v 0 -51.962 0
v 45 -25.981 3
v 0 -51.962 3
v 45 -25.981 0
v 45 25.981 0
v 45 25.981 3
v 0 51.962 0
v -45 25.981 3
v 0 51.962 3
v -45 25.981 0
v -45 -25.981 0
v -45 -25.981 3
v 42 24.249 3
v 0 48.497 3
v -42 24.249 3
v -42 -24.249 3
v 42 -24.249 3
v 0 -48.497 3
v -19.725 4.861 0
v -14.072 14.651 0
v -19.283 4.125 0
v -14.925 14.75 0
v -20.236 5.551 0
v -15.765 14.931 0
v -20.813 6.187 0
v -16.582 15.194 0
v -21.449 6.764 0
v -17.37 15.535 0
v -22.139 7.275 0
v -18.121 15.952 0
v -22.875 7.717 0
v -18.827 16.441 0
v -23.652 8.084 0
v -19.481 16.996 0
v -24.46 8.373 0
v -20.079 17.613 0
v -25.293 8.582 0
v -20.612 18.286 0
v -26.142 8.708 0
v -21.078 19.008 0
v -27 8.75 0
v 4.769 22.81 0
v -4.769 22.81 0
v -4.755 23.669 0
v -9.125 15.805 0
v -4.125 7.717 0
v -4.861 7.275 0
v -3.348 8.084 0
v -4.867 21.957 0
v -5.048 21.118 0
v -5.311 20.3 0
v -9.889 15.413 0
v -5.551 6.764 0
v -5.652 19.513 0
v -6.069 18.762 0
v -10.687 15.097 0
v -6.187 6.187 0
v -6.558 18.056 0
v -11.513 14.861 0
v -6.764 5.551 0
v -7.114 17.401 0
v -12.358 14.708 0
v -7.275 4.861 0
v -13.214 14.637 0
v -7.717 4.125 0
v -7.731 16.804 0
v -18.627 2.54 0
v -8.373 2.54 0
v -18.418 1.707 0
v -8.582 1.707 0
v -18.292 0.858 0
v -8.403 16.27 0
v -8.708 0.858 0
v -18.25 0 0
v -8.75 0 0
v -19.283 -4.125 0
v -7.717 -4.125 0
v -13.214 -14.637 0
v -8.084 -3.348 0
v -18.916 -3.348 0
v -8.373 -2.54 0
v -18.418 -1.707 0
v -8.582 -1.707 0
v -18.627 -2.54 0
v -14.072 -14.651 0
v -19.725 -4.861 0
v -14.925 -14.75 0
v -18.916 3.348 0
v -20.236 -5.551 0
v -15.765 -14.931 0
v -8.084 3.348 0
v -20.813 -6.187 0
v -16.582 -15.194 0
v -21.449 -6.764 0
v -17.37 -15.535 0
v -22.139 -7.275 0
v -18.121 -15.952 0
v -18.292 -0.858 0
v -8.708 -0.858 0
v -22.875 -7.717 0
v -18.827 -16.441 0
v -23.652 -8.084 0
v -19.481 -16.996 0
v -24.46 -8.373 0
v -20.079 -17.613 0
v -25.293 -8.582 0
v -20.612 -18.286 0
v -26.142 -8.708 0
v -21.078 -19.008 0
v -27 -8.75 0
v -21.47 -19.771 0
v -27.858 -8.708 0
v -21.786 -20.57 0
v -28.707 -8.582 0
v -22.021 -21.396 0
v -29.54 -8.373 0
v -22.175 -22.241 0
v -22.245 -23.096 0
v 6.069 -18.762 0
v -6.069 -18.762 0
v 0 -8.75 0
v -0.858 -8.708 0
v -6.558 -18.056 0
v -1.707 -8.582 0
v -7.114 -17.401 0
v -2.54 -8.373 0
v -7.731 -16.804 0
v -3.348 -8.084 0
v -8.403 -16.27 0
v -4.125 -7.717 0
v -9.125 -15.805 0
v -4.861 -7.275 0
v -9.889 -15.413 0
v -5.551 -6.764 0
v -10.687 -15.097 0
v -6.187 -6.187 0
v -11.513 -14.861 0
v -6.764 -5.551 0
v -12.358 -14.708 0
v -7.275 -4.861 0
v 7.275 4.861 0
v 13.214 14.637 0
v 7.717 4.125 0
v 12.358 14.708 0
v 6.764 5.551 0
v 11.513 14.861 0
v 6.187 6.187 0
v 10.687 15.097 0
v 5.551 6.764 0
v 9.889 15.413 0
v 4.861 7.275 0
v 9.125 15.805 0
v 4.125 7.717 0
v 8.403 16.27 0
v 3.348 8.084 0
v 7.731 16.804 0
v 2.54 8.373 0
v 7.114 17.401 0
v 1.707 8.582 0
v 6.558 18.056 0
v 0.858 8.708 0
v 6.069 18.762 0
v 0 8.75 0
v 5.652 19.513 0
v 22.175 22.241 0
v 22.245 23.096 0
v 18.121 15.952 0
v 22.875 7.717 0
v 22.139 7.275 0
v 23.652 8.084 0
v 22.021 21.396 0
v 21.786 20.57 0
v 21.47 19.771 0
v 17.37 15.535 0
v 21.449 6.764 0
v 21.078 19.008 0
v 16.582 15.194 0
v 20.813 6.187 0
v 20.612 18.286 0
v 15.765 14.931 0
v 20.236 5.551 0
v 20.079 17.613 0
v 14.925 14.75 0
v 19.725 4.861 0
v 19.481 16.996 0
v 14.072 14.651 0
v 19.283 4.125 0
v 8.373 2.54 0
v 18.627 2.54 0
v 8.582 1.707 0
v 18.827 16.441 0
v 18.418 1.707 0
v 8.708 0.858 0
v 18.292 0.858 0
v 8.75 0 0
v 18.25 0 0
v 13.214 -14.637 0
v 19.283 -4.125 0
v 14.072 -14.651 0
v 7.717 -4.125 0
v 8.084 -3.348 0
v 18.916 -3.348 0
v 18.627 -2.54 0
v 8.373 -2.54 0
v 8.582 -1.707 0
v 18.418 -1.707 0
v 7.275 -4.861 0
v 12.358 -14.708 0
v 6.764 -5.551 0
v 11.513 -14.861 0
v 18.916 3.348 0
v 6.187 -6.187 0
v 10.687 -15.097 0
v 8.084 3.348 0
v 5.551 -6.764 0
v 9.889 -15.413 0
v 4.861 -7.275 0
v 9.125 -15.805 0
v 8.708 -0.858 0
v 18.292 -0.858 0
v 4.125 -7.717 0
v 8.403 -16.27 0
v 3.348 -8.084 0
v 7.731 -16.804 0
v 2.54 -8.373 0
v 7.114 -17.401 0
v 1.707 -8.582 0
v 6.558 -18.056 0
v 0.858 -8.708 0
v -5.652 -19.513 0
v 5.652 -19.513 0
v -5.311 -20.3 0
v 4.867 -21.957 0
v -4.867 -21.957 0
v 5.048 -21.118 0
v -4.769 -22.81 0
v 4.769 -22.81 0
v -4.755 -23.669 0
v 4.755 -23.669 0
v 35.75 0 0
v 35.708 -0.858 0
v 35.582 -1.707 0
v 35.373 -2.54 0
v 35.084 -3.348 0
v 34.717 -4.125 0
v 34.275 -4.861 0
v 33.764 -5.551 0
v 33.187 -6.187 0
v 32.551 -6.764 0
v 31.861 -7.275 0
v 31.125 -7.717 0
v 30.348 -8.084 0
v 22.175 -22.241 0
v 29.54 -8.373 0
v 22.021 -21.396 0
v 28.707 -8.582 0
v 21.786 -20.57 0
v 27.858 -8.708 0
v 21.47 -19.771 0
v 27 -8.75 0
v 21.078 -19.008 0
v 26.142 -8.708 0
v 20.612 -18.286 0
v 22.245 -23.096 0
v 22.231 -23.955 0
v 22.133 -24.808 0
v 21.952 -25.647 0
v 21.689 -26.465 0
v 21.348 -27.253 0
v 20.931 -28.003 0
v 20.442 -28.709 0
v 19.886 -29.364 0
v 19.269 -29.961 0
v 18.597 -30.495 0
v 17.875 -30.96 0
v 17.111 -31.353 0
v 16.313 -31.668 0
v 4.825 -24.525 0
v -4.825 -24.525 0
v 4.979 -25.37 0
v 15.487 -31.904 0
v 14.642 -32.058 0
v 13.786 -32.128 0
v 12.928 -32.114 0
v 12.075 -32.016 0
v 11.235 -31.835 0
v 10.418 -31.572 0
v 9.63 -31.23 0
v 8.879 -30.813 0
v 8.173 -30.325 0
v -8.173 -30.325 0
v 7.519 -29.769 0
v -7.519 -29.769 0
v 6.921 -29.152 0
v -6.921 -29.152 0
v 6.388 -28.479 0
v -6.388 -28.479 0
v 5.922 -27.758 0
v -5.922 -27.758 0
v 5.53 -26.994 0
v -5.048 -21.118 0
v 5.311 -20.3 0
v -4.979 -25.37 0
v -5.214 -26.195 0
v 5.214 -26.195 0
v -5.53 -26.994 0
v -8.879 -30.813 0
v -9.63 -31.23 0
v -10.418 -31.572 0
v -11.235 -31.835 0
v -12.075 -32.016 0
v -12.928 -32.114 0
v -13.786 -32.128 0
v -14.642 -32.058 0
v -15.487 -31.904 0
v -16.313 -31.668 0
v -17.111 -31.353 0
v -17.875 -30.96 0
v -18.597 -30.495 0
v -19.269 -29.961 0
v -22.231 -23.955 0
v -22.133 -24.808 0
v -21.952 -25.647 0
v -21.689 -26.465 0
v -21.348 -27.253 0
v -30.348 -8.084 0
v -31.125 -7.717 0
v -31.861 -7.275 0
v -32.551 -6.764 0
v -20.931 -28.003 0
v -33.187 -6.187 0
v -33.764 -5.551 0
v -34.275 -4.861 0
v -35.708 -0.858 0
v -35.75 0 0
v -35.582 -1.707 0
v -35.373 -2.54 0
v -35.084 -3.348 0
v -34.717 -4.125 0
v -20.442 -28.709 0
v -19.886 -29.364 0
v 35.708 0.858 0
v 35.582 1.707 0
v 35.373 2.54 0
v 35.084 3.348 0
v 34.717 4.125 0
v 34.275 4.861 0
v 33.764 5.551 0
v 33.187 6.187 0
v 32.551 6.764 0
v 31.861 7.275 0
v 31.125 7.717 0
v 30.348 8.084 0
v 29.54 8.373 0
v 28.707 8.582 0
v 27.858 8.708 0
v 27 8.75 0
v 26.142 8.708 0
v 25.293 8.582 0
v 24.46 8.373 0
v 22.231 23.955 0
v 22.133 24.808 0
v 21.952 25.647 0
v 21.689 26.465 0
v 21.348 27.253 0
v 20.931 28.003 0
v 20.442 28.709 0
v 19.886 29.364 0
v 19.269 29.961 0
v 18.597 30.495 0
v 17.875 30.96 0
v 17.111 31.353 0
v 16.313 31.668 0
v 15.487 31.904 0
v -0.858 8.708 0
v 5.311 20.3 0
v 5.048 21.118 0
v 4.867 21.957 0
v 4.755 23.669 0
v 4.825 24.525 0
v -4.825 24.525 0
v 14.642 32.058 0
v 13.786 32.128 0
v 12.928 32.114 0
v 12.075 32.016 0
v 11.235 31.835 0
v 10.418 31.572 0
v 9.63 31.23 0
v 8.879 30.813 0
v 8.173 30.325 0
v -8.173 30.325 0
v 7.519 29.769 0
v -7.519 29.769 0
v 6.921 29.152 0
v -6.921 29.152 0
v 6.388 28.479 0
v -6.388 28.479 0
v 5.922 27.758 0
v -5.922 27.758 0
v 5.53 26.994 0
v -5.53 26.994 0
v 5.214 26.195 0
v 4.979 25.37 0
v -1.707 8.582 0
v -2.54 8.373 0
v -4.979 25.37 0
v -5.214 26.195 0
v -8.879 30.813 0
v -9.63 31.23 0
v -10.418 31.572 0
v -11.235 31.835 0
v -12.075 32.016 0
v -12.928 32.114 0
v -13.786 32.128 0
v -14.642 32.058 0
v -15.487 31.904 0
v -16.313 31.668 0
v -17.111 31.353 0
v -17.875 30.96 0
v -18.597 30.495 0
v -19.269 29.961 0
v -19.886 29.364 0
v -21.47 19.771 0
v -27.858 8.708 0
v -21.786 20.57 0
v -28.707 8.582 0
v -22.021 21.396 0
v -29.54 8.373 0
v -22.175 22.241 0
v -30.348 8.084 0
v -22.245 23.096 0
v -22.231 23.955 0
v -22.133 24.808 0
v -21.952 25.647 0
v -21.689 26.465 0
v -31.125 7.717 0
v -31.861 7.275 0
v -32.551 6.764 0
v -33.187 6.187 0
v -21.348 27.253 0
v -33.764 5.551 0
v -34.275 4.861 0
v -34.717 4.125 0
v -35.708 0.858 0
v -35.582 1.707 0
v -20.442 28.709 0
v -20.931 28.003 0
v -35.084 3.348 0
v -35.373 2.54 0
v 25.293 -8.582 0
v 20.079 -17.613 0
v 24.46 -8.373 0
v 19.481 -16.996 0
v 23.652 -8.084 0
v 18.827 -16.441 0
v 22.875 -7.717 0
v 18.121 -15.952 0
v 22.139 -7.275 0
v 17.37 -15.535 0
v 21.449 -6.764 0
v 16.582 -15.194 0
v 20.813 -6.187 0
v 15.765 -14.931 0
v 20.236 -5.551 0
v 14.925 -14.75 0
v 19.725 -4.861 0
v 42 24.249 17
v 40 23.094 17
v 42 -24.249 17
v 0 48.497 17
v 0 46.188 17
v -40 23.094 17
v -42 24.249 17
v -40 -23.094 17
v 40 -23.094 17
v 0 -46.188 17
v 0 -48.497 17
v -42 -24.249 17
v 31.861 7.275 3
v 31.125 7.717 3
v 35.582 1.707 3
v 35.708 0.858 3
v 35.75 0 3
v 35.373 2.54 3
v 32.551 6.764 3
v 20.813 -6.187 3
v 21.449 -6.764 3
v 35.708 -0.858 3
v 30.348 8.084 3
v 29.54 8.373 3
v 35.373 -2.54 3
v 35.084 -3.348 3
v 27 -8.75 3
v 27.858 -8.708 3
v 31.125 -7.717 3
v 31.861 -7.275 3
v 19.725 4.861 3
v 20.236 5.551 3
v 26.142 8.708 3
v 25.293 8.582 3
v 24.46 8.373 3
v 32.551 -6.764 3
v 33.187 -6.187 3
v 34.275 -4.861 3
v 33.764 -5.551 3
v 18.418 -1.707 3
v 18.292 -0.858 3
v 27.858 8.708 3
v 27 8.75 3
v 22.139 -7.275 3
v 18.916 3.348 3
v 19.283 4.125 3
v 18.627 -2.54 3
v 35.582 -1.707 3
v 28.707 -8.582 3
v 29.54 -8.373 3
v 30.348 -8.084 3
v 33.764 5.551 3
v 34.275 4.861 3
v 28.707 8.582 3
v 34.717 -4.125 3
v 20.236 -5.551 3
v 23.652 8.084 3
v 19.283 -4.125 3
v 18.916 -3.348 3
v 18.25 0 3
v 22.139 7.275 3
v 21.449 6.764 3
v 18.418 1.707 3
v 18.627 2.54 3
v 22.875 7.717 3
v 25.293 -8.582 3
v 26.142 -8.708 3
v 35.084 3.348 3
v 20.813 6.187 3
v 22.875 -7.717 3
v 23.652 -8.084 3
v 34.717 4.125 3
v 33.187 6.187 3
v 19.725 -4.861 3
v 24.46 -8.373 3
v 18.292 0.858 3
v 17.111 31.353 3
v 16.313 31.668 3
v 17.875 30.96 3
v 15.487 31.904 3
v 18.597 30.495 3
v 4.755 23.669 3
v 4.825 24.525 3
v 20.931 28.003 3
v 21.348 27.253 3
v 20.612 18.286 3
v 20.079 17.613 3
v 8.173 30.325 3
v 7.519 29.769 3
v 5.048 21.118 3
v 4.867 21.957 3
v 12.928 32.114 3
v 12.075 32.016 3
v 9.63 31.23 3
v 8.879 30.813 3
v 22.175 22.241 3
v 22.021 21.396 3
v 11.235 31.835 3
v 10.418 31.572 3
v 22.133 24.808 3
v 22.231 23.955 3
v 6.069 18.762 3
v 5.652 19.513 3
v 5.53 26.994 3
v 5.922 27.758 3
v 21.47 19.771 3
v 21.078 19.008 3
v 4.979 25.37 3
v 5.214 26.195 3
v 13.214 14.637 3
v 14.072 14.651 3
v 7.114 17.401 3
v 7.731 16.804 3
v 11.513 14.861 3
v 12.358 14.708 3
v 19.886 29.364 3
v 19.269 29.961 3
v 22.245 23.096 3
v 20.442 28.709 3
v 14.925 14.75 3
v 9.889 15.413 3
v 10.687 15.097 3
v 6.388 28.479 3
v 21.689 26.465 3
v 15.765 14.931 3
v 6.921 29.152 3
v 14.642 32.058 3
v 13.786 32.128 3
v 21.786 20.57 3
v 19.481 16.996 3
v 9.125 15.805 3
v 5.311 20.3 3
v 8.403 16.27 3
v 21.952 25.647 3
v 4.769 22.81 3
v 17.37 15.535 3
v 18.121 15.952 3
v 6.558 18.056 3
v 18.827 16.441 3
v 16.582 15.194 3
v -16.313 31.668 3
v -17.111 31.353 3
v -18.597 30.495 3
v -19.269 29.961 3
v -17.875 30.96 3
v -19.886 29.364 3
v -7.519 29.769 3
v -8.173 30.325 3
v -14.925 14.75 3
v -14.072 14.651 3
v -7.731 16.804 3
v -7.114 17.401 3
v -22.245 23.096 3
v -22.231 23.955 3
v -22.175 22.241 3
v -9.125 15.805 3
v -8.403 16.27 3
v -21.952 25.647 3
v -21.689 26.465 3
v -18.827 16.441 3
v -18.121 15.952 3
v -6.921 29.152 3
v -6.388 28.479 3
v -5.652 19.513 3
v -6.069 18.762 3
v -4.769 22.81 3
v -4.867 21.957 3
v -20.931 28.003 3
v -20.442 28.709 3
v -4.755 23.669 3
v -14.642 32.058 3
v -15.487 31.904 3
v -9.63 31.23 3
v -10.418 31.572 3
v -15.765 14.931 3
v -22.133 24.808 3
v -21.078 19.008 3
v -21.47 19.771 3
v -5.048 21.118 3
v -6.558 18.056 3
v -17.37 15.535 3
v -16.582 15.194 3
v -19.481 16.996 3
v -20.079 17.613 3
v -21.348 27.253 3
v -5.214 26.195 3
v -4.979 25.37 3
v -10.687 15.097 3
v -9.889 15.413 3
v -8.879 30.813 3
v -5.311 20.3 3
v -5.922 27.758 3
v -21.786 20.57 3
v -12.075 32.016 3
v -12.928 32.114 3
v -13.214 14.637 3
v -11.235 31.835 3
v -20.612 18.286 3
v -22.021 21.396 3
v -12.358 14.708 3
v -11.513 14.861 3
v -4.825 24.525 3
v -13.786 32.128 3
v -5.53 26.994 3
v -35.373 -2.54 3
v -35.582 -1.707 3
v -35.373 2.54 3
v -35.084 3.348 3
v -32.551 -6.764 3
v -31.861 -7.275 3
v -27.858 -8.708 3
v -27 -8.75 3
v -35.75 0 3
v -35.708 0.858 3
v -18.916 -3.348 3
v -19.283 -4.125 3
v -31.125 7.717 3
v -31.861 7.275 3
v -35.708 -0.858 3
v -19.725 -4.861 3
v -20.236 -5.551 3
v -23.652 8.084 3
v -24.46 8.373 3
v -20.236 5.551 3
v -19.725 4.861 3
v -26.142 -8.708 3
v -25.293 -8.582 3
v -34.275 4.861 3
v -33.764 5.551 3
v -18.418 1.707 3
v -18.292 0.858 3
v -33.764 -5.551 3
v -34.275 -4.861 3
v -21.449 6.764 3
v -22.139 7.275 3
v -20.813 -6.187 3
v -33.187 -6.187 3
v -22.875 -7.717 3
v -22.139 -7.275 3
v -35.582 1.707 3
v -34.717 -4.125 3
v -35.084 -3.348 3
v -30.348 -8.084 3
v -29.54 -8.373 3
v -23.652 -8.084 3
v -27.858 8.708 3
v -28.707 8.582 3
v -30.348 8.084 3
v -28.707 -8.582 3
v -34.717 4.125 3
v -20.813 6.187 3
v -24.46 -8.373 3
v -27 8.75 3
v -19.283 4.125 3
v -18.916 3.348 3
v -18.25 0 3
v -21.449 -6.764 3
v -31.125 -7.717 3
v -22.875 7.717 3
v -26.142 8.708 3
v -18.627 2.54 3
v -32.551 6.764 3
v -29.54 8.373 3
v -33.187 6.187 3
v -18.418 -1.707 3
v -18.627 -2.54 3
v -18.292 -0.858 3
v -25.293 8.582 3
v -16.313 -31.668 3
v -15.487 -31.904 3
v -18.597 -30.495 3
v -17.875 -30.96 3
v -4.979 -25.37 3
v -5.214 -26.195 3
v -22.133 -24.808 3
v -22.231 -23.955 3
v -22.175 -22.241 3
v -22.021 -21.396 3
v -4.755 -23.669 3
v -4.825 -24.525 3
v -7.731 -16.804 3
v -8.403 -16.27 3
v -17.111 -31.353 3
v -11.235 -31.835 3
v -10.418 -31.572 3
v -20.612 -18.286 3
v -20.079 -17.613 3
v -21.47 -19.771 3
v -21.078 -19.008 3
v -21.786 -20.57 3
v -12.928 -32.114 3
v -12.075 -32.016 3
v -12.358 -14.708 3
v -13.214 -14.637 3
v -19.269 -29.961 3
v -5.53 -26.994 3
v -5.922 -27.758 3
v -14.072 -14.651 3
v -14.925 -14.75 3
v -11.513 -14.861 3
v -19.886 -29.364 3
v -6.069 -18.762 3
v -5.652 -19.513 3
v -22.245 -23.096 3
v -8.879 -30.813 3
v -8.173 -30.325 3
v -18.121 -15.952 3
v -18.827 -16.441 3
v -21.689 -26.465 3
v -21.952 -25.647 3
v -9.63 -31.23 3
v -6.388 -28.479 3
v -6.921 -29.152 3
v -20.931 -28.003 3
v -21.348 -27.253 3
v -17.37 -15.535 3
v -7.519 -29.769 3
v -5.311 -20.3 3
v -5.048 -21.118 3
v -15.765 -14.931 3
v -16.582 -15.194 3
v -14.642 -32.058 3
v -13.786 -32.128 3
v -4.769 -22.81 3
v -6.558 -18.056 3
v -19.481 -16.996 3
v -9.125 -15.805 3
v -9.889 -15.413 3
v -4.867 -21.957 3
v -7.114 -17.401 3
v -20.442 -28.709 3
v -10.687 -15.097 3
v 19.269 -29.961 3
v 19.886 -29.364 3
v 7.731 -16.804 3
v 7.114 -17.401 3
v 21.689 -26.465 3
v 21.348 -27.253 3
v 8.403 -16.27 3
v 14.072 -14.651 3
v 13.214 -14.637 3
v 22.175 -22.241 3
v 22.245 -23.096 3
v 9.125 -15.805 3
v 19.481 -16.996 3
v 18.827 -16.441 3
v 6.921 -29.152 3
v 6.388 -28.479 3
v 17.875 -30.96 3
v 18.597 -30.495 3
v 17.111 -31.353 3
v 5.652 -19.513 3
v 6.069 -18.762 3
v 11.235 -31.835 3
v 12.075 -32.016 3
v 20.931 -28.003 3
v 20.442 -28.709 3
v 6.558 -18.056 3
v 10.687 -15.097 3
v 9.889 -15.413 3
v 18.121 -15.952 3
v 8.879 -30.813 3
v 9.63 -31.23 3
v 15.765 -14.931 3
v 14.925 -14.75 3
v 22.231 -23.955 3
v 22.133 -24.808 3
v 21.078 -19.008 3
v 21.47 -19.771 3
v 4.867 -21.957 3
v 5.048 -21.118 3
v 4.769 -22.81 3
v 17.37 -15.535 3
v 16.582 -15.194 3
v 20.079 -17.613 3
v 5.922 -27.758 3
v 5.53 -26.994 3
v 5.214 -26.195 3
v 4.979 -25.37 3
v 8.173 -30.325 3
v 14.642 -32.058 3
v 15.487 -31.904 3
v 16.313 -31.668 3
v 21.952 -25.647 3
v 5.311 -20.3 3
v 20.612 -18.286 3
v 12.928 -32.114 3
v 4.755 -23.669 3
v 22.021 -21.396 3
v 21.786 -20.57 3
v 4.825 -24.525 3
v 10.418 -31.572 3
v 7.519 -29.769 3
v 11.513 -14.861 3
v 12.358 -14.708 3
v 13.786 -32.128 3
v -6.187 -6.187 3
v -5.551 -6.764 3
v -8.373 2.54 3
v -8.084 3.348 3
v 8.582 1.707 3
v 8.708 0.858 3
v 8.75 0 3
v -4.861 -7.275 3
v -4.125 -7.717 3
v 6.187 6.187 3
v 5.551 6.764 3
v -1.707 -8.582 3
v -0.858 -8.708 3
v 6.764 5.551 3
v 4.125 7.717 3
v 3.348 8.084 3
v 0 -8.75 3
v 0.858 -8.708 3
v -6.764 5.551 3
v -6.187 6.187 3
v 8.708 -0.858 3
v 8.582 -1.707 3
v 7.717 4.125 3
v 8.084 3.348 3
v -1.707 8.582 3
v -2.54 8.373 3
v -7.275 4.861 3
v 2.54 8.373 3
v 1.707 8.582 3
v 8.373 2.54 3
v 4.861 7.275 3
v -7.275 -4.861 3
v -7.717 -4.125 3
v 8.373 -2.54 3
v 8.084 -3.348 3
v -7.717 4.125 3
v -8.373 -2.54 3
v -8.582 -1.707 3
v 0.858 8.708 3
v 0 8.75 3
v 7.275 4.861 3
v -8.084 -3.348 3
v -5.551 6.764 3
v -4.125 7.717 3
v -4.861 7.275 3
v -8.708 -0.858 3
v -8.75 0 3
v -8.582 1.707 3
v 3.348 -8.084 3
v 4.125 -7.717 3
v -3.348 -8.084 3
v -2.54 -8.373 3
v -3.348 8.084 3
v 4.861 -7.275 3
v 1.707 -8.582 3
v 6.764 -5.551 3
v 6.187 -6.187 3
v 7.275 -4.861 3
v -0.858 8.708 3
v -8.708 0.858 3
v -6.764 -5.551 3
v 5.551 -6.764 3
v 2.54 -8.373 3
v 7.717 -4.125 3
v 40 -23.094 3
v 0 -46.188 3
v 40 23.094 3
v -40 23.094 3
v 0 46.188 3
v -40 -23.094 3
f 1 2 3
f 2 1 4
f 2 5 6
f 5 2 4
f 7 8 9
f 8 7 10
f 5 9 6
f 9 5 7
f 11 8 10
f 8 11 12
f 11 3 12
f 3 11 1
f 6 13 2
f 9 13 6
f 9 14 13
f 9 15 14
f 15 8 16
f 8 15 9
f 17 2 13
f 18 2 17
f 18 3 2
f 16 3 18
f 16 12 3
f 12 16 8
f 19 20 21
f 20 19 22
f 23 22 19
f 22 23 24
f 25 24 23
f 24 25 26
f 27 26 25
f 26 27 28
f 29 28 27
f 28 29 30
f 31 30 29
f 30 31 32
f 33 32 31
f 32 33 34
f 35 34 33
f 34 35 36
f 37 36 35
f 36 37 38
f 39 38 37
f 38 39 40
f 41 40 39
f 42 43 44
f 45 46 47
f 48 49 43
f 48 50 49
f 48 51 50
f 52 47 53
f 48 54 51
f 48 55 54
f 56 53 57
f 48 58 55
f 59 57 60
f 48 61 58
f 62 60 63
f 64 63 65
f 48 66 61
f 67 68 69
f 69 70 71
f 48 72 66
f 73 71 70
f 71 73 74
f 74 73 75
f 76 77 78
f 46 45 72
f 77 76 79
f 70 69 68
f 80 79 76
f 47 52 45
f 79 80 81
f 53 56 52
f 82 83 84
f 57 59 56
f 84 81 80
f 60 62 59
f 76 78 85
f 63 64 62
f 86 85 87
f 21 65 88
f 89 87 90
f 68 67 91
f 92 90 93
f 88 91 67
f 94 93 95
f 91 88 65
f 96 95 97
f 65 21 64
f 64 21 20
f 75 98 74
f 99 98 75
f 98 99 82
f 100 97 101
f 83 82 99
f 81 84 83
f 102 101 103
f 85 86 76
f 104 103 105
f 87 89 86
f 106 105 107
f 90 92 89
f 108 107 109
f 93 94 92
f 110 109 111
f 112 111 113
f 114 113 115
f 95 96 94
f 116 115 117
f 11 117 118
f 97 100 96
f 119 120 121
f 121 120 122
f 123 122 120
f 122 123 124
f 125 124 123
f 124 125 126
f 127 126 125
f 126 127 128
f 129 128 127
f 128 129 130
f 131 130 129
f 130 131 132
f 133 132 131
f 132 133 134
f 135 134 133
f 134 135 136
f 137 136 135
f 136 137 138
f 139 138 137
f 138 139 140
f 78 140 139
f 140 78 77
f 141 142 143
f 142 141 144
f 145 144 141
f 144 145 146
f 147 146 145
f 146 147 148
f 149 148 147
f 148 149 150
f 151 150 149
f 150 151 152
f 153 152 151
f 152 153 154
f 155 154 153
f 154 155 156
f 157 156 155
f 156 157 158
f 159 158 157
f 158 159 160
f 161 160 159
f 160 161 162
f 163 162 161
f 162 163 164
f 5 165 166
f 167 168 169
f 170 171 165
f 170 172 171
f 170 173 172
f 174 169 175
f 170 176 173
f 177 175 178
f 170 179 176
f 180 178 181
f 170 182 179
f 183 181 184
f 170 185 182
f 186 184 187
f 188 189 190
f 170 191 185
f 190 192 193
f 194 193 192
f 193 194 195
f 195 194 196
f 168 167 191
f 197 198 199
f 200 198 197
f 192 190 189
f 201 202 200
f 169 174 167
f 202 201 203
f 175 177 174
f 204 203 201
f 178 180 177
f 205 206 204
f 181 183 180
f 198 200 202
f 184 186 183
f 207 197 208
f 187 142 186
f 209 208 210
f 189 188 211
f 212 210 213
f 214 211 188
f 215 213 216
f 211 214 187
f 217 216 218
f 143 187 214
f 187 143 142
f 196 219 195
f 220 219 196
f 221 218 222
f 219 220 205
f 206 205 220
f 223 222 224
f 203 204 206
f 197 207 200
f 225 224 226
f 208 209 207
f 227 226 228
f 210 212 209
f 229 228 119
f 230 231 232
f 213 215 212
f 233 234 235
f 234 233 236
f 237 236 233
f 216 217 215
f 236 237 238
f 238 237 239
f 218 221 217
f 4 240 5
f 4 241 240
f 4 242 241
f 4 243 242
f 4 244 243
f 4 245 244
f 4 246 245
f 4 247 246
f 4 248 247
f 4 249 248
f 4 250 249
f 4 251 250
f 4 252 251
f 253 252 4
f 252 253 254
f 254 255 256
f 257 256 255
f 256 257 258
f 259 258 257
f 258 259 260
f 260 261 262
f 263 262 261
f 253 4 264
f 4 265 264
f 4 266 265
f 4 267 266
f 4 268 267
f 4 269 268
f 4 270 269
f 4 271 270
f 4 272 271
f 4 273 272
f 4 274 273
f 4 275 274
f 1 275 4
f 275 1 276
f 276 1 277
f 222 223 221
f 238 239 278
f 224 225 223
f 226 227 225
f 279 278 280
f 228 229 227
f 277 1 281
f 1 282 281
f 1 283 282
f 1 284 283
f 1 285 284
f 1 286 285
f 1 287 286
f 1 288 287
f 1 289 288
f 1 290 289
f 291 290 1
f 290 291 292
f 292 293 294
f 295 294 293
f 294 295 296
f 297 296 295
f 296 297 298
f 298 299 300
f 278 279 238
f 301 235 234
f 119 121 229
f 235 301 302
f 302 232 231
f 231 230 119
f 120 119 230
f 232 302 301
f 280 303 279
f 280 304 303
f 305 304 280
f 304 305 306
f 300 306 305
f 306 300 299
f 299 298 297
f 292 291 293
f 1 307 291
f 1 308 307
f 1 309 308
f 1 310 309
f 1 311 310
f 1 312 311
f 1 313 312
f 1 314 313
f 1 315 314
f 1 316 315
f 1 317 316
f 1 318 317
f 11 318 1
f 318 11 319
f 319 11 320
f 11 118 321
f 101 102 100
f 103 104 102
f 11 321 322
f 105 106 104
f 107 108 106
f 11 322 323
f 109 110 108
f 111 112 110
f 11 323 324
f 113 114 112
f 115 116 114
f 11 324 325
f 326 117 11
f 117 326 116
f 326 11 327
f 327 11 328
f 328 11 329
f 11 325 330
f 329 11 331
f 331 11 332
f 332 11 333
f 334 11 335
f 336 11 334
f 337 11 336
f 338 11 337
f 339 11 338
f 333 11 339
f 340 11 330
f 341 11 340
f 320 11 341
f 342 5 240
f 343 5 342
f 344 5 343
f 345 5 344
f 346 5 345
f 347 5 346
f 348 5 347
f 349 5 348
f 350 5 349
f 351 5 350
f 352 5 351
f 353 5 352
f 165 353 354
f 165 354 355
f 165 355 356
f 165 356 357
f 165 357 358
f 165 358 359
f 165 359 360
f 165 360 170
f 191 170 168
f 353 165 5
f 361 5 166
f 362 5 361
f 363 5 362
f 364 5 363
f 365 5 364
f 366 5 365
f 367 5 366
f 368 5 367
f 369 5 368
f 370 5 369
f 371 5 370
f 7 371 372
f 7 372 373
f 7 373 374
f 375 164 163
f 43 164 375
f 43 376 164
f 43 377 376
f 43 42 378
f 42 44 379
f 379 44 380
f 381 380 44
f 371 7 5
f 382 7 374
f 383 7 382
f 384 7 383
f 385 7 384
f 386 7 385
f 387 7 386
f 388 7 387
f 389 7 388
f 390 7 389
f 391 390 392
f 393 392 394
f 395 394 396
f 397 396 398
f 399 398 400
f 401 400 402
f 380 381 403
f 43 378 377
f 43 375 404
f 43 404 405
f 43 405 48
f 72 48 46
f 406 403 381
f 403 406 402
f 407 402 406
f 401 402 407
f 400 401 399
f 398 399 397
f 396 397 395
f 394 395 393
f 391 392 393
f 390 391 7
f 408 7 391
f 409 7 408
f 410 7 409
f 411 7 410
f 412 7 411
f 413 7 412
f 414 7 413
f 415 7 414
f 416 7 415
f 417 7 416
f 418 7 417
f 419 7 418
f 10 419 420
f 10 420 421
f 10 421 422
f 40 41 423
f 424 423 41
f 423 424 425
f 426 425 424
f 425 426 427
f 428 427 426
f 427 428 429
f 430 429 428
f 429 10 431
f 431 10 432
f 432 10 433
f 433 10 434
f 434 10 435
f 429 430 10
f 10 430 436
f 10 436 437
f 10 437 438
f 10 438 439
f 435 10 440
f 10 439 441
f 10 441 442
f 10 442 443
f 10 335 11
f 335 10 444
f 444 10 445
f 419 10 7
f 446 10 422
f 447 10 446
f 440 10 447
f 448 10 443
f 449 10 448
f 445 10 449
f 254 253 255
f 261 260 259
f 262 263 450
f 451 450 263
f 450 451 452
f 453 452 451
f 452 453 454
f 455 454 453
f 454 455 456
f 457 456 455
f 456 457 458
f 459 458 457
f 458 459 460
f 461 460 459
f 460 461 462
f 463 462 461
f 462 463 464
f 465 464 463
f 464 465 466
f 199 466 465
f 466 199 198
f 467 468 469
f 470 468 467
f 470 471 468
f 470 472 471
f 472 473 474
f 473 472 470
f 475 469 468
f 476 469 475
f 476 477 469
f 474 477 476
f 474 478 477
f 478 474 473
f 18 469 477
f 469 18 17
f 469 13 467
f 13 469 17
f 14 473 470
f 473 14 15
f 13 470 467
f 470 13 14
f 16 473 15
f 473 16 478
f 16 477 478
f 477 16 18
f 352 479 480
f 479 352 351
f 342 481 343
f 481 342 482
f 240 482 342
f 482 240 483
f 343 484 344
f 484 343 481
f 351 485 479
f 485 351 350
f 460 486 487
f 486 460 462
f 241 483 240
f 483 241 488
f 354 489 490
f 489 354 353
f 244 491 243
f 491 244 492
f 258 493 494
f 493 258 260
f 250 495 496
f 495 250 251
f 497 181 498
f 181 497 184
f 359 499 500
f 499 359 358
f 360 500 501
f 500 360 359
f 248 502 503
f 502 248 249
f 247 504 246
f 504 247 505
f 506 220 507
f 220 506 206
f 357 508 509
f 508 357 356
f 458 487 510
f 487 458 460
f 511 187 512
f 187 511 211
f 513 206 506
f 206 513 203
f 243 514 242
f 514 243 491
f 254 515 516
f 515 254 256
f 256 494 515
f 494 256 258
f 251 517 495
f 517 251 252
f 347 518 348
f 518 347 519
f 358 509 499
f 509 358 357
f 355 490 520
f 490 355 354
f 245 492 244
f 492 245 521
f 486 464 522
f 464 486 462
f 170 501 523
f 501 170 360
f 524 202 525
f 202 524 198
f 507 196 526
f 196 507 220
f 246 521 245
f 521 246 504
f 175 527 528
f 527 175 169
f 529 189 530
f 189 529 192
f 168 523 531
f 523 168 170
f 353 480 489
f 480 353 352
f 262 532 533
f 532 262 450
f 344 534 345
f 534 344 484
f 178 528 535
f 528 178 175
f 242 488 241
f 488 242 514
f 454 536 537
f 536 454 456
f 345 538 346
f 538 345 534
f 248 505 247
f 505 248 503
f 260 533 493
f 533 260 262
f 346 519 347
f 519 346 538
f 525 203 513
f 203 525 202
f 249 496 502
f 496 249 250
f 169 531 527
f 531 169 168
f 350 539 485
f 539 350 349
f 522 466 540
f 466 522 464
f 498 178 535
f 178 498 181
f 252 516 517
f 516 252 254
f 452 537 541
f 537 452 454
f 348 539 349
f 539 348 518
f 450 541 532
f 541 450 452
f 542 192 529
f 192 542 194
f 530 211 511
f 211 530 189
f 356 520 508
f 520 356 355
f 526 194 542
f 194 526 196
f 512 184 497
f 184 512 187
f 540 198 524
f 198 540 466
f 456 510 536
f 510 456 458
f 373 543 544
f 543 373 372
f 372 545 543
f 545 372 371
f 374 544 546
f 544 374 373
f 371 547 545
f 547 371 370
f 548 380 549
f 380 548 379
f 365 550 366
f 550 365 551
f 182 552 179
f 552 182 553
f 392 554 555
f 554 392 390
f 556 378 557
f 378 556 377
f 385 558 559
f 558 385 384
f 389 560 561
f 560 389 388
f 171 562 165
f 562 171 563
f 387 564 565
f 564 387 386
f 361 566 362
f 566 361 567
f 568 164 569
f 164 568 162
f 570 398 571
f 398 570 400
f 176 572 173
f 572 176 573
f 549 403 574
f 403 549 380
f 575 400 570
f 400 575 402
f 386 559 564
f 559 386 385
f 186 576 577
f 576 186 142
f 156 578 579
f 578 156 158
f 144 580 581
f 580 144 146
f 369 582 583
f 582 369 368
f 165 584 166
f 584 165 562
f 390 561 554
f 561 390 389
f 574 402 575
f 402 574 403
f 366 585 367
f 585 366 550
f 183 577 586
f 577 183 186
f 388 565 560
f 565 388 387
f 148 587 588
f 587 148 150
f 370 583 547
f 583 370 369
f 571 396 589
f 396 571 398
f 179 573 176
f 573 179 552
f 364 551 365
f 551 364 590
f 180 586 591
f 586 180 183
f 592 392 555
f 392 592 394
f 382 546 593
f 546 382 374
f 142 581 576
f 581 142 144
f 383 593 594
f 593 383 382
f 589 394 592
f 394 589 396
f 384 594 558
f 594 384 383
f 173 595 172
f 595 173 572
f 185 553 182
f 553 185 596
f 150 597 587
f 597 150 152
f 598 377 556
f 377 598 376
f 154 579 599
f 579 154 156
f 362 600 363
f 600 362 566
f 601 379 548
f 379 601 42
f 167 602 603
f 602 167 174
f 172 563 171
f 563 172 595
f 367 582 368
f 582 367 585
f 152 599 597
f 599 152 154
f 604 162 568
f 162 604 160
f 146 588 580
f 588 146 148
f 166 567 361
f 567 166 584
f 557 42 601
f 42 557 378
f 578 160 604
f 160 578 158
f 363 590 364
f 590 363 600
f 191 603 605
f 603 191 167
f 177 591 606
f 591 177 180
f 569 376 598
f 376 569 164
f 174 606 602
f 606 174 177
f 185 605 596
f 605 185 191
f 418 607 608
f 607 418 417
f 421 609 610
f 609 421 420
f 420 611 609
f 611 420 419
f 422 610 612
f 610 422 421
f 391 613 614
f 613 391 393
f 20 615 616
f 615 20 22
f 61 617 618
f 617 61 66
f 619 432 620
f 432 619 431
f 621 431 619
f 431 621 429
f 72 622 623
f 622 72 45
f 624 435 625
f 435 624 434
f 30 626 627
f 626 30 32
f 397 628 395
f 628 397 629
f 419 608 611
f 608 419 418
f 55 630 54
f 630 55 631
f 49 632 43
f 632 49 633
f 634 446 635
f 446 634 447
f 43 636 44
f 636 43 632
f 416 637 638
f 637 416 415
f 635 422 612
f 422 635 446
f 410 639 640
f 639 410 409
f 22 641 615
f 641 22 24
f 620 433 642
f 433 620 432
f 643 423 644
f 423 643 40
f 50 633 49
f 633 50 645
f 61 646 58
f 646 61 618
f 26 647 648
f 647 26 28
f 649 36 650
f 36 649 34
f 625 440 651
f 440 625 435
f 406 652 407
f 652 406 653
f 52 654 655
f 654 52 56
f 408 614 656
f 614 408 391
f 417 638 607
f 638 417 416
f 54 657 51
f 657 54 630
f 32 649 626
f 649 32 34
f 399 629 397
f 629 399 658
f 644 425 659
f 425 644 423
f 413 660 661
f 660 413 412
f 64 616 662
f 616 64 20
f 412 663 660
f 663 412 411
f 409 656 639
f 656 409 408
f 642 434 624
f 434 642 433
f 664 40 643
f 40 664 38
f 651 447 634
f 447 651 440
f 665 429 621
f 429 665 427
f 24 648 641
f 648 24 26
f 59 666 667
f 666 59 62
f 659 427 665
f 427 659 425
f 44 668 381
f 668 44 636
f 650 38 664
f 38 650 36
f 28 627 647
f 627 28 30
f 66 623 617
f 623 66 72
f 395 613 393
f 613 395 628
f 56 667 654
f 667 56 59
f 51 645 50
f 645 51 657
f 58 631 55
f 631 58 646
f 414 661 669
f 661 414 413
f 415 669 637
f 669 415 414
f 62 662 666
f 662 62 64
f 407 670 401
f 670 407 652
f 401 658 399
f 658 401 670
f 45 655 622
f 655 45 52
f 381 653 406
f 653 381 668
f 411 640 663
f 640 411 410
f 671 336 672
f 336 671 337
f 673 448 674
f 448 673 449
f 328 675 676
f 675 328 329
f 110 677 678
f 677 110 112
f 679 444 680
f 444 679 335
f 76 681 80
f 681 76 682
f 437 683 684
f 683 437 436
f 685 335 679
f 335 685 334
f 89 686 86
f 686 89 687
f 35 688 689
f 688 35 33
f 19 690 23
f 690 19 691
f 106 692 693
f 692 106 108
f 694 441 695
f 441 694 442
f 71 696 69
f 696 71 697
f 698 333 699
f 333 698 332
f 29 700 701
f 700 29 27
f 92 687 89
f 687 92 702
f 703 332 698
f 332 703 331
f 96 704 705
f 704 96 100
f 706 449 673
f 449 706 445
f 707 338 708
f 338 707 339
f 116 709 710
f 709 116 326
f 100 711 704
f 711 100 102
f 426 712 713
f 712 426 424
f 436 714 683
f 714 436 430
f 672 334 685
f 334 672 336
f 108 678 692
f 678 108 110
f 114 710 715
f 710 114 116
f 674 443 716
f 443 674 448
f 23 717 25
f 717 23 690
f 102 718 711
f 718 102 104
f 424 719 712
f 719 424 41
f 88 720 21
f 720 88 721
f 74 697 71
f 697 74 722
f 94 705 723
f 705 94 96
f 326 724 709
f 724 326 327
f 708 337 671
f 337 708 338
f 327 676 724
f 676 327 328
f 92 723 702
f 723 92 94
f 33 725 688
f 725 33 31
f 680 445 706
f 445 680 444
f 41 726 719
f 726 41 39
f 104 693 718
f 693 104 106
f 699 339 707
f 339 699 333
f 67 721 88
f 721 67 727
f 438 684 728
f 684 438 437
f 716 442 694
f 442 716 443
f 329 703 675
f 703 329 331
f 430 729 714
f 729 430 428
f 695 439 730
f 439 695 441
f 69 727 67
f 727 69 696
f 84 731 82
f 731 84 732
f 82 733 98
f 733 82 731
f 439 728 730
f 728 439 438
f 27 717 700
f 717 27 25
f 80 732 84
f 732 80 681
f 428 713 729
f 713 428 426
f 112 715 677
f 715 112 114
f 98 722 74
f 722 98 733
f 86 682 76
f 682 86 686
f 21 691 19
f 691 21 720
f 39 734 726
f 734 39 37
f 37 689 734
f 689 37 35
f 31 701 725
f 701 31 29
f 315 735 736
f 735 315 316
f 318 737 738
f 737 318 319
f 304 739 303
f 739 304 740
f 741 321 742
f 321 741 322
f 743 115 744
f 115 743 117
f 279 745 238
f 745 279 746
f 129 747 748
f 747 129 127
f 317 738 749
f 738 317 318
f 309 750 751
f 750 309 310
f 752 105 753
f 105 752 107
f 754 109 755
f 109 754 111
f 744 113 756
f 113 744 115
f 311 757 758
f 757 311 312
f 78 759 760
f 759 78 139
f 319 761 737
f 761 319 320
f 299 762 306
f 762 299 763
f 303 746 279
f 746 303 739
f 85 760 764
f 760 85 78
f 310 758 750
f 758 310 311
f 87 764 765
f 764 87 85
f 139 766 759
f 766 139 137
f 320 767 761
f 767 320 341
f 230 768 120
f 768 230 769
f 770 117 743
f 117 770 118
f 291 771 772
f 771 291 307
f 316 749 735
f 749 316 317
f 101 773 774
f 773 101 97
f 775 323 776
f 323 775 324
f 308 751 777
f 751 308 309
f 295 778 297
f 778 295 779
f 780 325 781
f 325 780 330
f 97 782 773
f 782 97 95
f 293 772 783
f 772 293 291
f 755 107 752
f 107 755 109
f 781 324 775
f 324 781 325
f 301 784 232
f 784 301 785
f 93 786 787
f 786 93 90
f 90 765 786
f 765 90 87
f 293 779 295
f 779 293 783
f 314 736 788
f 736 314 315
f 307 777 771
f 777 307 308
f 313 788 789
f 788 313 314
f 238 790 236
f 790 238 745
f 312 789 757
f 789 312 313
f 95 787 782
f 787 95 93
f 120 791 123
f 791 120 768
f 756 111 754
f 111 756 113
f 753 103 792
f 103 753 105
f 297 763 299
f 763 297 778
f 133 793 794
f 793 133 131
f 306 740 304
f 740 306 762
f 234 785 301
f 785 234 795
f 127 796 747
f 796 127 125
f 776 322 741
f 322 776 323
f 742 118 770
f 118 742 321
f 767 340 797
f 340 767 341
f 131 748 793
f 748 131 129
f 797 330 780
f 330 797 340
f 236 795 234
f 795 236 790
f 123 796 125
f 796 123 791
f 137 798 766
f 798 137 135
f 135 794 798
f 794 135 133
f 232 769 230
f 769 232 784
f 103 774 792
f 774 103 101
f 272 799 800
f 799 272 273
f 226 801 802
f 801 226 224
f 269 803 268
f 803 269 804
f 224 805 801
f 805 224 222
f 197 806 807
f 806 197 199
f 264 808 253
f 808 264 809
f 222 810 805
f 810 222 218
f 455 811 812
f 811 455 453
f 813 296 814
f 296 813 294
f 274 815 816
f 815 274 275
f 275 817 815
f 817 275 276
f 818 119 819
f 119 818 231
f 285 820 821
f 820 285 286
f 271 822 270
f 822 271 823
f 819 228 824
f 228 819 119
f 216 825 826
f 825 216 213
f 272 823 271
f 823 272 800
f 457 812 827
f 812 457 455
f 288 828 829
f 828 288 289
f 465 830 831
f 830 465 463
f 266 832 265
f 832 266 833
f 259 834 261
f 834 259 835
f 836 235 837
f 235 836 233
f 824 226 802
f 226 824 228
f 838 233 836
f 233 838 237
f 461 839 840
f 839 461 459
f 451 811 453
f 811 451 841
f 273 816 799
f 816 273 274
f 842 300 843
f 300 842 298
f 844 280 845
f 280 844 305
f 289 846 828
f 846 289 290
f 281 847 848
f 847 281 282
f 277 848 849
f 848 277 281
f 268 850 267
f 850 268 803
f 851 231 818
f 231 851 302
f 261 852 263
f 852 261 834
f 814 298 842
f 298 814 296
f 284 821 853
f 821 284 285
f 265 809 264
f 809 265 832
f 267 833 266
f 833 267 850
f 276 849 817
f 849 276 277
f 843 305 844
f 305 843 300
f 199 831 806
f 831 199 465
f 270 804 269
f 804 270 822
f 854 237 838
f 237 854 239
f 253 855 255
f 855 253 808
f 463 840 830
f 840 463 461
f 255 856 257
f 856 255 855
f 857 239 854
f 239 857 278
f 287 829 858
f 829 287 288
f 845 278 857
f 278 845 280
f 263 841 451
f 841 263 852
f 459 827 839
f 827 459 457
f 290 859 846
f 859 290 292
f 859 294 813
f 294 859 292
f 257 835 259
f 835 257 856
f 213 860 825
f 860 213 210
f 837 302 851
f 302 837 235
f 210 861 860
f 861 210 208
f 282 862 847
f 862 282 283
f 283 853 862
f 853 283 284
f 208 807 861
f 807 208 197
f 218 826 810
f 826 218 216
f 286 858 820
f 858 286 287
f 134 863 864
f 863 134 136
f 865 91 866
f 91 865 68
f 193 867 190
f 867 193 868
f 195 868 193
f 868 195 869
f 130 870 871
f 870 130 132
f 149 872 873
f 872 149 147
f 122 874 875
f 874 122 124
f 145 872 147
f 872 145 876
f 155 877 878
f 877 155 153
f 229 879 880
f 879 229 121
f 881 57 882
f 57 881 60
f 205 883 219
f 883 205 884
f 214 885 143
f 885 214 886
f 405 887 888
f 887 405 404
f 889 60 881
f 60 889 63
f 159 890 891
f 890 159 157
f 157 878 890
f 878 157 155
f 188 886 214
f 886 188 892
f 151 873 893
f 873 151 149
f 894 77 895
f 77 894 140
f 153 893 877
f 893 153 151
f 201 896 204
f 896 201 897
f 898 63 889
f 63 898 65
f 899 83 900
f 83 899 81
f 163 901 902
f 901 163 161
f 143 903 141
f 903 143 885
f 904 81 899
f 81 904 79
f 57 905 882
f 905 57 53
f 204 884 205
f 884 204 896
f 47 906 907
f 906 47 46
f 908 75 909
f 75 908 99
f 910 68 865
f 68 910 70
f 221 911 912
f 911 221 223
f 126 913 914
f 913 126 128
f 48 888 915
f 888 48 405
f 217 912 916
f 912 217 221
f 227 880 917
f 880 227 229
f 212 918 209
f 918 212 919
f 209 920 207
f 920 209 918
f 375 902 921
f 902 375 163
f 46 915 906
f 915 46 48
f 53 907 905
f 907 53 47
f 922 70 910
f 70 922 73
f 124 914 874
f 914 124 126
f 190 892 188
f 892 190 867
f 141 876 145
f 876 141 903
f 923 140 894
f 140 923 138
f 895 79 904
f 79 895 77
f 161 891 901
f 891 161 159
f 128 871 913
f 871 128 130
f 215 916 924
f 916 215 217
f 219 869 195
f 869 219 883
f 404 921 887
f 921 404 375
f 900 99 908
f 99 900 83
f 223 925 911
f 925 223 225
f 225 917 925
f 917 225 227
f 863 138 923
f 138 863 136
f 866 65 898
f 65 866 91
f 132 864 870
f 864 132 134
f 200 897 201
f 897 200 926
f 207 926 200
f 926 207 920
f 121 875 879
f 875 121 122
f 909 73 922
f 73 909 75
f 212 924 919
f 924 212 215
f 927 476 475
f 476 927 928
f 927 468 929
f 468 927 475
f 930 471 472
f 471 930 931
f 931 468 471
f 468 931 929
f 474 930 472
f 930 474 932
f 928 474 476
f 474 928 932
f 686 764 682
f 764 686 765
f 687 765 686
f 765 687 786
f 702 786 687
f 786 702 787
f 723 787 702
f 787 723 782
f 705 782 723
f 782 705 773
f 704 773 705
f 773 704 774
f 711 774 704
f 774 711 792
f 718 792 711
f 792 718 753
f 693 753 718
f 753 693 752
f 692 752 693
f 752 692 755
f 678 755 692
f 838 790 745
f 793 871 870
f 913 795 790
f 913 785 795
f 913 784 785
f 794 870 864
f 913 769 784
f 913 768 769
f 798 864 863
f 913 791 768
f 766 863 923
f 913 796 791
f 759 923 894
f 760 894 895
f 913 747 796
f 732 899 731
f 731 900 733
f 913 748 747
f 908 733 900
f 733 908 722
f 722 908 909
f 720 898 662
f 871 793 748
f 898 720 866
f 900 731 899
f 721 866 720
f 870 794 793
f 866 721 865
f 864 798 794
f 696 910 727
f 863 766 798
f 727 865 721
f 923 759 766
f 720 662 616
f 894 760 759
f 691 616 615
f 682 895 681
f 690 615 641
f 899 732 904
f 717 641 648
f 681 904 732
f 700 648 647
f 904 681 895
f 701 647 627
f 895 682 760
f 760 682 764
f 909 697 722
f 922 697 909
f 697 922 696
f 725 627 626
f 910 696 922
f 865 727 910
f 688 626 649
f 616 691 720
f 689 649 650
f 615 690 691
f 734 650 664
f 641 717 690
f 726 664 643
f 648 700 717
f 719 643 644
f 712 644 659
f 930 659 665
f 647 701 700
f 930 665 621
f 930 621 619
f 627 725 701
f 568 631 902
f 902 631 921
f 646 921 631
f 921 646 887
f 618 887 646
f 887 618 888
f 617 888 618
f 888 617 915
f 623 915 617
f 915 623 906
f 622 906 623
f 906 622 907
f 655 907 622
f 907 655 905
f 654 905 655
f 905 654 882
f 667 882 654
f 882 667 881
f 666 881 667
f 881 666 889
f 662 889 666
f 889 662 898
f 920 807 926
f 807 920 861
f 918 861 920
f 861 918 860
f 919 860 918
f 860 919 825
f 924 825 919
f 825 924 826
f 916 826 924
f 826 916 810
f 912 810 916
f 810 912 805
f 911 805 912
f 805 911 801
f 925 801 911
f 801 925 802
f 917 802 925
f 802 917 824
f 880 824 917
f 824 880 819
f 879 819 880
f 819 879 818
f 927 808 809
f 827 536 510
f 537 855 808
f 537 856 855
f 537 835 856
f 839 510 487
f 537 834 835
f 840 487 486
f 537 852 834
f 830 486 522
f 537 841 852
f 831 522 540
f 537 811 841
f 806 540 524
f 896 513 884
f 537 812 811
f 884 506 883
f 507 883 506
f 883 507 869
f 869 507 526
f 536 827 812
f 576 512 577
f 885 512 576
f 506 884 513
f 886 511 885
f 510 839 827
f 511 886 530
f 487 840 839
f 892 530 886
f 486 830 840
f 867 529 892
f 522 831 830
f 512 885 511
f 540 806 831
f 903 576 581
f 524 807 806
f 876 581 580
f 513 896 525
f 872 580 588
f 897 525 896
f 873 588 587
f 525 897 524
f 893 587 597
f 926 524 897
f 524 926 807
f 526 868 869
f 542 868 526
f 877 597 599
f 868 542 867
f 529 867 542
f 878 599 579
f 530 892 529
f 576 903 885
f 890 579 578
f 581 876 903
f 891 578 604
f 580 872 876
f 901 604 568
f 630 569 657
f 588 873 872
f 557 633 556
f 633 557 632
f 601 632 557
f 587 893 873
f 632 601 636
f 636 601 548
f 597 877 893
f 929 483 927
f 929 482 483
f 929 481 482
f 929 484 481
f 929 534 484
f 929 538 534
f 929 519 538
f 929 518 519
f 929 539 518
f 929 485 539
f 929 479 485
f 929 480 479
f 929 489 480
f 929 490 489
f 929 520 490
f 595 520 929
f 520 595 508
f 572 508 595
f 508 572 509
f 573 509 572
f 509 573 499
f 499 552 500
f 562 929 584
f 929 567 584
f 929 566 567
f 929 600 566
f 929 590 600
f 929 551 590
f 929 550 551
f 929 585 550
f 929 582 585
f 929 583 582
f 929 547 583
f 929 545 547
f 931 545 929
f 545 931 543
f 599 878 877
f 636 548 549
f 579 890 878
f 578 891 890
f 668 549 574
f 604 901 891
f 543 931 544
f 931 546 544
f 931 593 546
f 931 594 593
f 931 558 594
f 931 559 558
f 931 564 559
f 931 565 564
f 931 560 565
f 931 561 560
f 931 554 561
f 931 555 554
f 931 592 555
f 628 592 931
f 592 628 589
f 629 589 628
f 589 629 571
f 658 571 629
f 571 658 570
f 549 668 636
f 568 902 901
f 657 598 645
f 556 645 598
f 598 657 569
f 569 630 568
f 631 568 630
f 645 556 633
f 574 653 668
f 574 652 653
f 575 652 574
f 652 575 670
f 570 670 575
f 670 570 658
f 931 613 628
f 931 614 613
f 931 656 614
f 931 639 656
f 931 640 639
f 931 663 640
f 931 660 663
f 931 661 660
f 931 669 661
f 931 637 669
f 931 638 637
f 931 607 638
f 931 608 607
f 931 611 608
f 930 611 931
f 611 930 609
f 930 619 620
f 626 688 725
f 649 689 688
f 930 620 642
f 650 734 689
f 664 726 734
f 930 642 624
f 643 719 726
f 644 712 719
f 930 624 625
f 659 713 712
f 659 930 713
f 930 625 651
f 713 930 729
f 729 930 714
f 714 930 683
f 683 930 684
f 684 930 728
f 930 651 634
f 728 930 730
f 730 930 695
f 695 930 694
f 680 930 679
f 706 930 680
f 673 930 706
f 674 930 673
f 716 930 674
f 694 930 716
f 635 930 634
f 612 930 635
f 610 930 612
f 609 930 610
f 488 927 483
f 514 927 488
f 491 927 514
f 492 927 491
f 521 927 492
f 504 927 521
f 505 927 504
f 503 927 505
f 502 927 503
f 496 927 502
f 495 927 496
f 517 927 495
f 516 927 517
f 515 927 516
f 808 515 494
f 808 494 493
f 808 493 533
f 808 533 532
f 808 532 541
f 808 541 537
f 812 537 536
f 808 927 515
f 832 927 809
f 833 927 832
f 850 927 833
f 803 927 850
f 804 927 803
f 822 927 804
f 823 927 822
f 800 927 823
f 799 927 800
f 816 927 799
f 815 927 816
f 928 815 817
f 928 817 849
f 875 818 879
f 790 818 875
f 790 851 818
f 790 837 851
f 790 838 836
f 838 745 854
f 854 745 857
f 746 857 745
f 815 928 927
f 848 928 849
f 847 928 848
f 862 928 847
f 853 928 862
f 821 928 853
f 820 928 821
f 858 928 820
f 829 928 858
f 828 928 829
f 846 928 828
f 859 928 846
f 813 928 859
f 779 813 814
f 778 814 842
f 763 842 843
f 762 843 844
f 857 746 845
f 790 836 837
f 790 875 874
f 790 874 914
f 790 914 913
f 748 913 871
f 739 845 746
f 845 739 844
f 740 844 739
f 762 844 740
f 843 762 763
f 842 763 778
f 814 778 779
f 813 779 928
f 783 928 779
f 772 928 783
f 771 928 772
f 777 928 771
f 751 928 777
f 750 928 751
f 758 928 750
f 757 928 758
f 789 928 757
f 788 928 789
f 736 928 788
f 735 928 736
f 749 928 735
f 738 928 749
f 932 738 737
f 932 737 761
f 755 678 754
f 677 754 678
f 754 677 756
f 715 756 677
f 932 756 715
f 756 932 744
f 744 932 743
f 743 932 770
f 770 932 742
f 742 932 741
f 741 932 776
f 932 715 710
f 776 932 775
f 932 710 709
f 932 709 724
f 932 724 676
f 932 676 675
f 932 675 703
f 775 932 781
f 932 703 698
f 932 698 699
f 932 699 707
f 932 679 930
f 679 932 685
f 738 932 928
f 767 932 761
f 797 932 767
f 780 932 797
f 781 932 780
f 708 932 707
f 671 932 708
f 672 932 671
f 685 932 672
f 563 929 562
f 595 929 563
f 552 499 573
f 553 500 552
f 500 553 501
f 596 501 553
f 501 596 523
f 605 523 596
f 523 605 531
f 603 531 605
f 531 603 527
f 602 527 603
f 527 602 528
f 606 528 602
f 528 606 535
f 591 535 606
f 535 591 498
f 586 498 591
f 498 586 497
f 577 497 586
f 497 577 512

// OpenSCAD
// --- Dimensions ---
plate_thickness = 3;            // Thickness of the hexagonal plate
hex_across_flats = 90;           // Distance between parallel sides of the plate
hex_skirt_across_flats = 84;     // Distance between parallel sides of the skirt
skirt_wall_thickness = 2;        // Thickness of the hexagonal skirt wall
skirt_height_total = 20;         // Total height of the part (Z=0 to Z=20)

hole_diameter = 17.5;            // Diameter of the conical tube holes
hole_spacing_diameter = 54;      // Diameter of the circle on which holes are placed
sleeve_outer_diameter = 21.5;    // Outside diameter of the sleeves
sleeve_height_total = 20;        // Total height of the sleeves (Z=0 to Z=20)

// --- Constants ---
$fn = 64;

// Helper function to calculate the radius of a regular hexagon from across-flats distance
// Radius (to vertex) = (across_flats / 2) / cos(30)
function hex_radius(across_flats) = (across_flats / 2) / cos(30);

// --- Construction Logic ---
// The part is built as a single solid by unioning the plate, sleeves, and skirt,
// then subtracting the holes and the inner void of the skirt.

difference() {
    // 1. THE SOLID MASS
    union() {
        // The Hexagonal Plate (Z=0 to Z=3)
        // Rotate 30 degrees so that two flats are parallel to the X axis.
        rotate([0, 0, 30])
        cylinder(h = plate_thickness, r = hex_radius(hex_across_flats), $fn = 6);

        // The Sleeves (Z=3 to Z=20)
        // Center sleeve
        cylinder(h = skirt_height_total - plate_thickness, d = sleeve_outer_diameter);
        
        // 6 Peripheral sleeves
        for (a = [0 : 60 : 300]) {
            rotate([0, 0, a])
            translate([hole_spacing_diameter / 2, 0, plate_thickness])
            cylinder(h = skirt_height_total - plate_thickness, d = sleeve_outer_diameter);
        }

        // The Hexagonal Skirt (Z=3 to Z=20)
        // Outer shell: 84mm across flats
        rotate([0, 0, 30])
        cylinder(h = skirt_height_total - plate_thickness, r = hex_radius(hex_skirt_across_flats), $fn = 6);
    }

    // 2. THE SUBTRACTIONS
    
    // A. The 7 Holes (through the plate and through the sleeves)
    // Center hole
    translate([0, 0, -0.01])
    cylinder(h = skirt_height_total + 0.02, d = hole_diameter);
    
    // 6 Peripheral holes
    for (a = [0 : 60 : 300]) {
        rotate([0, 0, a])
        translate([hole_spacing_diameter / 2, 0, -0.01])
        cylinder(h = skirt_height_total + 0.02, d = hole_diameter);
    }

    // B. The Skirt Inner Void (to create the 2mm wall)
    // The skirt is 84mm across flats. The inner void is 84 - (2 * 2) = 80mm across flats.
    // This void starts at the plate (Z=3) and goes to the top (Z=20).
    translate([0, 0, plate_thickness])
    rotate([0, 0, 30])
    cylinder(h = skirt_height_total - plate_thickness + 0.01, r = hex_radius(hex_skirt_across_flats - 2 * skirt_wall_thickness), $fn = 6);
}
